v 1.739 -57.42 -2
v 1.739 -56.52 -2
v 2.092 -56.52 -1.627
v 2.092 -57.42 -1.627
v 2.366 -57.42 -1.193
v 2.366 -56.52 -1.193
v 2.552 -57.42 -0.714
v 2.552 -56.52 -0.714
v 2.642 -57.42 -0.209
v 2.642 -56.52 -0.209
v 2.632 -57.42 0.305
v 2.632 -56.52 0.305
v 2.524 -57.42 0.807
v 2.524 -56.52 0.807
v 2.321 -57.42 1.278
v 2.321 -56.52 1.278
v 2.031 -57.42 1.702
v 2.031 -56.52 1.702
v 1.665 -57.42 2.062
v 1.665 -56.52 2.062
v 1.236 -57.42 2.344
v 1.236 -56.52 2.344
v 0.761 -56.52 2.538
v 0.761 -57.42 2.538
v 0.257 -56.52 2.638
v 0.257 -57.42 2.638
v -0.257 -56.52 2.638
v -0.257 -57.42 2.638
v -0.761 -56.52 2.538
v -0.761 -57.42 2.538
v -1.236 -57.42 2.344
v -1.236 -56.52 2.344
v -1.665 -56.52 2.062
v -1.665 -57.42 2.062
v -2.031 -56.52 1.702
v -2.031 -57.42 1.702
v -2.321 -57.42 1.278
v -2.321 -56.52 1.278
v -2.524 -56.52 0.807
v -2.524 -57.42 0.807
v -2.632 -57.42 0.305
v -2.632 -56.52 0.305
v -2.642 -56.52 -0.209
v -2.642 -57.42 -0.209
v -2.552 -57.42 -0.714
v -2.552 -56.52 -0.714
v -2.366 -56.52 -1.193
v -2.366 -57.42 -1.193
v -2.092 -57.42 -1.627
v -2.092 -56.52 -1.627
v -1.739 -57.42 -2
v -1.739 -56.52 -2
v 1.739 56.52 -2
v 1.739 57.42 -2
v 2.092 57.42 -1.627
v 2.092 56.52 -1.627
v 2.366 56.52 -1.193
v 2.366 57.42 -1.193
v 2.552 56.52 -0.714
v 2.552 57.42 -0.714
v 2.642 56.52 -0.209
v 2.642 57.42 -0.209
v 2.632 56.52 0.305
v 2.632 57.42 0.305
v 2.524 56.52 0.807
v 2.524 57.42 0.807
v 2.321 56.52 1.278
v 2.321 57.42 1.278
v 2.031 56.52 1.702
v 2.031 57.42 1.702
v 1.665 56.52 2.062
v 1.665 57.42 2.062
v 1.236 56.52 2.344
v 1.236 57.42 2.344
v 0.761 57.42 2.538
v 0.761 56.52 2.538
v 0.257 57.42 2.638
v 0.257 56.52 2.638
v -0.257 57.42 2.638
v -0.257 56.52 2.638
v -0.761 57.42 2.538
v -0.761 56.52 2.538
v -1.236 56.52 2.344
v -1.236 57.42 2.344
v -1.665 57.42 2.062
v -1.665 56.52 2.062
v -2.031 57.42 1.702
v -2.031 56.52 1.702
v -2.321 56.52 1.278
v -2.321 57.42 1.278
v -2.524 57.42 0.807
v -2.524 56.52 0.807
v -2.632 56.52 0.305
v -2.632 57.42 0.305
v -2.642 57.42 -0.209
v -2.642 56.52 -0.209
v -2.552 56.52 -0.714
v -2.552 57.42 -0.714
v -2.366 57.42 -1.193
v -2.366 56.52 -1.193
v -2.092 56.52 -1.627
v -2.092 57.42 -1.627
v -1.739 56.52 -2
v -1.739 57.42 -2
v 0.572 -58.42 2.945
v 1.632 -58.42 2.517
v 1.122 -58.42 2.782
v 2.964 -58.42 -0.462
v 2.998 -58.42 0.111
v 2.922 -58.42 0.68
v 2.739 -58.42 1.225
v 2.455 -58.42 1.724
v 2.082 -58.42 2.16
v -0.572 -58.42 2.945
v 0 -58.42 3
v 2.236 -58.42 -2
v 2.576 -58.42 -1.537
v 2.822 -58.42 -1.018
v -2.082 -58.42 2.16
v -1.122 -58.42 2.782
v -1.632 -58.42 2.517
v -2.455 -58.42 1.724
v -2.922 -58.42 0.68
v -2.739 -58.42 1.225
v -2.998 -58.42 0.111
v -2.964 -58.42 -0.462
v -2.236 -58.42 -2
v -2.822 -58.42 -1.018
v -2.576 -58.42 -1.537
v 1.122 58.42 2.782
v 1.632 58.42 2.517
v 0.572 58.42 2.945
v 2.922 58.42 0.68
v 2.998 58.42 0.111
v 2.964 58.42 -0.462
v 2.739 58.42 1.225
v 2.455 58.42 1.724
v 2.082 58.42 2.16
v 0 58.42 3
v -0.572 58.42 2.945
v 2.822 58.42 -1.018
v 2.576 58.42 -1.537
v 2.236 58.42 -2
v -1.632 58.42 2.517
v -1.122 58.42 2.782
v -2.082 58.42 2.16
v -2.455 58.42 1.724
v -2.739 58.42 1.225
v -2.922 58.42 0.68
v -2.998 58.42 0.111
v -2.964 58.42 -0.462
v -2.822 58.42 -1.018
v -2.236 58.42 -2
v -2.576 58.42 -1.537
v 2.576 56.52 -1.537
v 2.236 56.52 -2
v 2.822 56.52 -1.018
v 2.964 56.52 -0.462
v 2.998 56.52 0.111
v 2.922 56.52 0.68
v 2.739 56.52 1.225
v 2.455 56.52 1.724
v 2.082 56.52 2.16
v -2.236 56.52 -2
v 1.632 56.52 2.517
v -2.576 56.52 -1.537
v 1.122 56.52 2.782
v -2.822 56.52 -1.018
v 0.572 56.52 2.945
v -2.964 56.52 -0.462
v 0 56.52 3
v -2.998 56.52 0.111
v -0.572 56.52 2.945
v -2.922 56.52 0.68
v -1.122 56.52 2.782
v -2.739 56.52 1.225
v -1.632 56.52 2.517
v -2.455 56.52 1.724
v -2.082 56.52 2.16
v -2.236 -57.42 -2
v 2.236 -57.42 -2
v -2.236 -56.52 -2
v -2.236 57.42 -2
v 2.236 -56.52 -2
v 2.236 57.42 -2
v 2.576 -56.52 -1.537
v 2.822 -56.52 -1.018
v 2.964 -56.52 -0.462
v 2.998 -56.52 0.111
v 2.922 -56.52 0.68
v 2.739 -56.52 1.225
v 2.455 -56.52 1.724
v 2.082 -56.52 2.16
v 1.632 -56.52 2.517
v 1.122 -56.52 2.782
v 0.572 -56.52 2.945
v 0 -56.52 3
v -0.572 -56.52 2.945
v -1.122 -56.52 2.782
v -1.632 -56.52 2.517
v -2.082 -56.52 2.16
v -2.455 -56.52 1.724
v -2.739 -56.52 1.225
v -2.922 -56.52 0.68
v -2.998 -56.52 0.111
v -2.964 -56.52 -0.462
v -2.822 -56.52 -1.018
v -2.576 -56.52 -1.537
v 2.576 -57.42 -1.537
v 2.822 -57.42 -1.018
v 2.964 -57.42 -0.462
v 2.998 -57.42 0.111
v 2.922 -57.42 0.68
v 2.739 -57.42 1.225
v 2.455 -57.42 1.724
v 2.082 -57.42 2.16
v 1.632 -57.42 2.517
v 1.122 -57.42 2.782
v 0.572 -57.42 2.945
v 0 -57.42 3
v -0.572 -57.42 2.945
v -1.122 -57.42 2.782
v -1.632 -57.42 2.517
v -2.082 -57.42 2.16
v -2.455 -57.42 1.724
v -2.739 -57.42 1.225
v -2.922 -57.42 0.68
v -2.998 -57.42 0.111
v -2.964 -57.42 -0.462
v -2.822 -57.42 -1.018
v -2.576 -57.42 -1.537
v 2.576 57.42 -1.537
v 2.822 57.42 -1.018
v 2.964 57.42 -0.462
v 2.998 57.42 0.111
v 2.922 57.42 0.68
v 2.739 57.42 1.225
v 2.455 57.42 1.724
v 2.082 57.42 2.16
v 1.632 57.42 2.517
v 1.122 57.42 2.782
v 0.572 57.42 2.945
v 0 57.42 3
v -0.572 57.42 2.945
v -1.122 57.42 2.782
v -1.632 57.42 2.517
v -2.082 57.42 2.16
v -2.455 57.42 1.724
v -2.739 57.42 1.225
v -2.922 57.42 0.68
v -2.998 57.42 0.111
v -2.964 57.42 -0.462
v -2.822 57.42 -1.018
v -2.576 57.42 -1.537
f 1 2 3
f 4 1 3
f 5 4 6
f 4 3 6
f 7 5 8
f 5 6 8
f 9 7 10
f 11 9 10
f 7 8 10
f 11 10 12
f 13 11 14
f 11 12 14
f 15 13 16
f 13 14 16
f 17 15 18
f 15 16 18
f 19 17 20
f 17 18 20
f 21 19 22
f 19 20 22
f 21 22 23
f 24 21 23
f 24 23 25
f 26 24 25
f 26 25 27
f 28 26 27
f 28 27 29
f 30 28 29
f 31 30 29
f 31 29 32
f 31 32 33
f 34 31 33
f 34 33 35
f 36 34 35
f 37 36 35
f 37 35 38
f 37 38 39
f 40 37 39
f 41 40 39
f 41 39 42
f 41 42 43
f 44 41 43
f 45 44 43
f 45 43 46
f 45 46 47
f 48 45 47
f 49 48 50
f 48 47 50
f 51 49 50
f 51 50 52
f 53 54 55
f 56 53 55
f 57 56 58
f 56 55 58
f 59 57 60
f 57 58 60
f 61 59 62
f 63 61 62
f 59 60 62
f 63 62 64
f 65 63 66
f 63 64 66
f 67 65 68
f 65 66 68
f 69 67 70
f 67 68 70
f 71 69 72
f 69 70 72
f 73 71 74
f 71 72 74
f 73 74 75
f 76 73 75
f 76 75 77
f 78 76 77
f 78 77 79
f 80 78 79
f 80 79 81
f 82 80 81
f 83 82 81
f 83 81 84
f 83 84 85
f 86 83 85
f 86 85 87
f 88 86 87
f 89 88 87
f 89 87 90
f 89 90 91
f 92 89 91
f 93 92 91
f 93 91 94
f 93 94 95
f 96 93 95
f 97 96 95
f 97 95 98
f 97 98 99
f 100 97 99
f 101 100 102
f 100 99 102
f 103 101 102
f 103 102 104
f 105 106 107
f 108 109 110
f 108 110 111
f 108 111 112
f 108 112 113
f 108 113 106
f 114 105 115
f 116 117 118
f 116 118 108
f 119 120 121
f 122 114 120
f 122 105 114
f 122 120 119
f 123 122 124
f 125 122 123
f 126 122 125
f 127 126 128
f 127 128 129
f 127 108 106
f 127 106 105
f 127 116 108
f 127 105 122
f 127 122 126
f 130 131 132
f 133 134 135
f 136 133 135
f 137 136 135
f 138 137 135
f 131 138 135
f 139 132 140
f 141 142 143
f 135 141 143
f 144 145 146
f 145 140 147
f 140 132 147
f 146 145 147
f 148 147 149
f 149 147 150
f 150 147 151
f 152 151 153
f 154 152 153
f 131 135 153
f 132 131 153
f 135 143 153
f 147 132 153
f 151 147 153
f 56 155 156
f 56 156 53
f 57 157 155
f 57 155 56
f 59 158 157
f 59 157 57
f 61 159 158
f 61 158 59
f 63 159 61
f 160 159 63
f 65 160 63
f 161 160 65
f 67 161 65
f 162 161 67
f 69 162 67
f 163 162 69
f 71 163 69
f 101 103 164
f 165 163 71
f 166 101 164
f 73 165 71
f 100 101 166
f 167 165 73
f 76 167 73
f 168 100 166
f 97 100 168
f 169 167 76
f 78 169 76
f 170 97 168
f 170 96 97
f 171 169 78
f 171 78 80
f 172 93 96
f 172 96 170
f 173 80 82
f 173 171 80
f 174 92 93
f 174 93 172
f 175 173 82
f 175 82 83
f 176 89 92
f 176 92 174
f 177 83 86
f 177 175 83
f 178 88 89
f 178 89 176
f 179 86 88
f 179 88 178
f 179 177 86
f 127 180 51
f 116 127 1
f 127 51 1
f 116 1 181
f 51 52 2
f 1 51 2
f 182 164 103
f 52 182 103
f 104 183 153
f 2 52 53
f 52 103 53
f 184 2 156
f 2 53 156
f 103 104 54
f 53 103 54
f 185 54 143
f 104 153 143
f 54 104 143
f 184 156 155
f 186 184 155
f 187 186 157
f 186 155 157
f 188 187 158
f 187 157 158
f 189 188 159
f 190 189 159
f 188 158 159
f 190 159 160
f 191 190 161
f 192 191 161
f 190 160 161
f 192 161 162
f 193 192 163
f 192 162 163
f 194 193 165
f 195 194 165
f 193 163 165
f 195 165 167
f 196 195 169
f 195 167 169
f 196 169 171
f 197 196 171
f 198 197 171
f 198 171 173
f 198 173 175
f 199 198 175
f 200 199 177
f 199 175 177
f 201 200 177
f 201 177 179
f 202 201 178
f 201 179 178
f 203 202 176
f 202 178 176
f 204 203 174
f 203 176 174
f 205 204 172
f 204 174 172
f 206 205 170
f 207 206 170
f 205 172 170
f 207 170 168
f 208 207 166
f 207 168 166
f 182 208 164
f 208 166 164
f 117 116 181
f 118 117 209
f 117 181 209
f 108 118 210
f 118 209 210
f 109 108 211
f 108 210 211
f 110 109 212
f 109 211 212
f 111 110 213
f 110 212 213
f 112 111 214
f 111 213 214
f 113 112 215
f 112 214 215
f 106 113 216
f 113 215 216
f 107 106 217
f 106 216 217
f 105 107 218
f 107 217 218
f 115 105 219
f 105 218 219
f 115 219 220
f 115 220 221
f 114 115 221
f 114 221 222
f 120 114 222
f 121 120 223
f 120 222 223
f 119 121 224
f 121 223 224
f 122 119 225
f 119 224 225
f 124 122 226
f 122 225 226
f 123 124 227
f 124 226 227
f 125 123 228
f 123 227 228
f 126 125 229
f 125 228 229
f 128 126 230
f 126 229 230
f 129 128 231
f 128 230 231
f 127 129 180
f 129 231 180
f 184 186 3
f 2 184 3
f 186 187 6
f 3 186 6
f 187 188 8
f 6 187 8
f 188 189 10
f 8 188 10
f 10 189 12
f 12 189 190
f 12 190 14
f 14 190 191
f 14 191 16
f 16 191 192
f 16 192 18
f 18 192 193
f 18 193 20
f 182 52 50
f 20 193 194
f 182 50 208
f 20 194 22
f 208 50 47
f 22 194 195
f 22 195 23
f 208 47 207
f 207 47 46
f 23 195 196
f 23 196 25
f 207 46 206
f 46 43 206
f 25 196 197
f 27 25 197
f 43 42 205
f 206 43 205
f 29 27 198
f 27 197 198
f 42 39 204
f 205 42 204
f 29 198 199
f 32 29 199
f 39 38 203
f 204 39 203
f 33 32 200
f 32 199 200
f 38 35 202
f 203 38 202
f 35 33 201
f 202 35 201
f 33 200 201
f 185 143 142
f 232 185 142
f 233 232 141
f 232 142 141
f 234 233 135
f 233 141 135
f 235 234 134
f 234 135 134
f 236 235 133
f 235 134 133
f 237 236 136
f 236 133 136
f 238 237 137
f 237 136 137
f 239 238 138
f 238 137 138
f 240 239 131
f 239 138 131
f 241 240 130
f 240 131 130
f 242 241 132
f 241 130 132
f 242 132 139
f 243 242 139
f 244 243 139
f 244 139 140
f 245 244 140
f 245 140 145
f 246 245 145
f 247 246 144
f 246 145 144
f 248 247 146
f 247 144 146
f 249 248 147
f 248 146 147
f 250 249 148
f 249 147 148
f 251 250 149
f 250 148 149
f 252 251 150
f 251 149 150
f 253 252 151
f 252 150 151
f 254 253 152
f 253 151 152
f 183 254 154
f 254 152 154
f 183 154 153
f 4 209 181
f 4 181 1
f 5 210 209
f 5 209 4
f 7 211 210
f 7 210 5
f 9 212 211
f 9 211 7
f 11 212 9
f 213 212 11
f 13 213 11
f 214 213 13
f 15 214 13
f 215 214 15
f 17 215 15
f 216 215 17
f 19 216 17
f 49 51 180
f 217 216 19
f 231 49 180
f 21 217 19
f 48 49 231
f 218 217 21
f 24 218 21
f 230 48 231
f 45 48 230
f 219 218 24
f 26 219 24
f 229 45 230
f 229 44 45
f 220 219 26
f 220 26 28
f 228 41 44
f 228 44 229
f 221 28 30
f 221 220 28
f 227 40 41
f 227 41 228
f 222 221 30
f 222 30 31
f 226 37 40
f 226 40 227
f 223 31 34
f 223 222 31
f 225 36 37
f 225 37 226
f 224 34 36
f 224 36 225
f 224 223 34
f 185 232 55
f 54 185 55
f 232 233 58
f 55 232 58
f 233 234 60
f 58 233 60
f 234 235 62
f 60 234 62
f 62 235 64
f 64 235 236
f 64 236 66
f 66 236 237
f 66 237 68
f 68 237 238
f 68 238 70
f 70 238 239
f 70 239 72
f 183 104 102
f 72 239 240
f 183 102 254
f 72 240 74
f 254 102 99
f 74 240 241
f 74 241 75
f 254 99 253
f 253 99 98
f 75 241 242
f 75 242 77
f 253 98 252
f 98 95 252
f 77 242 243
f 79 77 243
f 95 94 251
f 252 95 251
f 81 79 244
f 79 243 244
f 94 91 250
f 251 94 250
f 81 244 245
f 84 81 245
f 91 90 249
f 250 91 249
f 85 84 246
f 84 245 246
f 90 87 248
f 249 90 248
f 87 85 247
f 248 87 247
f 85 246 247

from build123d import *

# Parameters (mm, degrees)
BOSS_EXTRUDE1_DEPTH = 58.42
SKETCH2_W           = 0.35
SKETCH2_H           = 0.9


with BuildPart() as part:
    # Sketch1 → Boss-Extrude1 (new body, symmetric)
    with BuildSketch(Plane(origin=(0, 0, 0), x_dir=(1, 0, 0), z_dir=(0, 1, 0))):
        with BuildLine():
            Line((-2.236067977, 2), (2.236067977, 2))
            ThreePointArc((2.236067977, 2), (0, -3), (-2.236067977, 2))
        make_face()
    extrude(amount=BOSS_EXTRUDE1_DEPTH, both=True)

    # Sketch2 → Cut-Revolve1 (revolve, cut)
    with BuildSketch(Plane.XY):
        with Locations((2.825, 56.97)):
            Rectangle(SKETCH2_W, SKETCH2_H)
        with Locations((2.825, -56.97)):
            Rectangle(SKETCH2_W, SKETCH2_H)
    revolve(axis=Axis((0, 48.05613995, 0), (0, -1, 0)), mode=Mode.SUBTRACT)


solid = part.part
